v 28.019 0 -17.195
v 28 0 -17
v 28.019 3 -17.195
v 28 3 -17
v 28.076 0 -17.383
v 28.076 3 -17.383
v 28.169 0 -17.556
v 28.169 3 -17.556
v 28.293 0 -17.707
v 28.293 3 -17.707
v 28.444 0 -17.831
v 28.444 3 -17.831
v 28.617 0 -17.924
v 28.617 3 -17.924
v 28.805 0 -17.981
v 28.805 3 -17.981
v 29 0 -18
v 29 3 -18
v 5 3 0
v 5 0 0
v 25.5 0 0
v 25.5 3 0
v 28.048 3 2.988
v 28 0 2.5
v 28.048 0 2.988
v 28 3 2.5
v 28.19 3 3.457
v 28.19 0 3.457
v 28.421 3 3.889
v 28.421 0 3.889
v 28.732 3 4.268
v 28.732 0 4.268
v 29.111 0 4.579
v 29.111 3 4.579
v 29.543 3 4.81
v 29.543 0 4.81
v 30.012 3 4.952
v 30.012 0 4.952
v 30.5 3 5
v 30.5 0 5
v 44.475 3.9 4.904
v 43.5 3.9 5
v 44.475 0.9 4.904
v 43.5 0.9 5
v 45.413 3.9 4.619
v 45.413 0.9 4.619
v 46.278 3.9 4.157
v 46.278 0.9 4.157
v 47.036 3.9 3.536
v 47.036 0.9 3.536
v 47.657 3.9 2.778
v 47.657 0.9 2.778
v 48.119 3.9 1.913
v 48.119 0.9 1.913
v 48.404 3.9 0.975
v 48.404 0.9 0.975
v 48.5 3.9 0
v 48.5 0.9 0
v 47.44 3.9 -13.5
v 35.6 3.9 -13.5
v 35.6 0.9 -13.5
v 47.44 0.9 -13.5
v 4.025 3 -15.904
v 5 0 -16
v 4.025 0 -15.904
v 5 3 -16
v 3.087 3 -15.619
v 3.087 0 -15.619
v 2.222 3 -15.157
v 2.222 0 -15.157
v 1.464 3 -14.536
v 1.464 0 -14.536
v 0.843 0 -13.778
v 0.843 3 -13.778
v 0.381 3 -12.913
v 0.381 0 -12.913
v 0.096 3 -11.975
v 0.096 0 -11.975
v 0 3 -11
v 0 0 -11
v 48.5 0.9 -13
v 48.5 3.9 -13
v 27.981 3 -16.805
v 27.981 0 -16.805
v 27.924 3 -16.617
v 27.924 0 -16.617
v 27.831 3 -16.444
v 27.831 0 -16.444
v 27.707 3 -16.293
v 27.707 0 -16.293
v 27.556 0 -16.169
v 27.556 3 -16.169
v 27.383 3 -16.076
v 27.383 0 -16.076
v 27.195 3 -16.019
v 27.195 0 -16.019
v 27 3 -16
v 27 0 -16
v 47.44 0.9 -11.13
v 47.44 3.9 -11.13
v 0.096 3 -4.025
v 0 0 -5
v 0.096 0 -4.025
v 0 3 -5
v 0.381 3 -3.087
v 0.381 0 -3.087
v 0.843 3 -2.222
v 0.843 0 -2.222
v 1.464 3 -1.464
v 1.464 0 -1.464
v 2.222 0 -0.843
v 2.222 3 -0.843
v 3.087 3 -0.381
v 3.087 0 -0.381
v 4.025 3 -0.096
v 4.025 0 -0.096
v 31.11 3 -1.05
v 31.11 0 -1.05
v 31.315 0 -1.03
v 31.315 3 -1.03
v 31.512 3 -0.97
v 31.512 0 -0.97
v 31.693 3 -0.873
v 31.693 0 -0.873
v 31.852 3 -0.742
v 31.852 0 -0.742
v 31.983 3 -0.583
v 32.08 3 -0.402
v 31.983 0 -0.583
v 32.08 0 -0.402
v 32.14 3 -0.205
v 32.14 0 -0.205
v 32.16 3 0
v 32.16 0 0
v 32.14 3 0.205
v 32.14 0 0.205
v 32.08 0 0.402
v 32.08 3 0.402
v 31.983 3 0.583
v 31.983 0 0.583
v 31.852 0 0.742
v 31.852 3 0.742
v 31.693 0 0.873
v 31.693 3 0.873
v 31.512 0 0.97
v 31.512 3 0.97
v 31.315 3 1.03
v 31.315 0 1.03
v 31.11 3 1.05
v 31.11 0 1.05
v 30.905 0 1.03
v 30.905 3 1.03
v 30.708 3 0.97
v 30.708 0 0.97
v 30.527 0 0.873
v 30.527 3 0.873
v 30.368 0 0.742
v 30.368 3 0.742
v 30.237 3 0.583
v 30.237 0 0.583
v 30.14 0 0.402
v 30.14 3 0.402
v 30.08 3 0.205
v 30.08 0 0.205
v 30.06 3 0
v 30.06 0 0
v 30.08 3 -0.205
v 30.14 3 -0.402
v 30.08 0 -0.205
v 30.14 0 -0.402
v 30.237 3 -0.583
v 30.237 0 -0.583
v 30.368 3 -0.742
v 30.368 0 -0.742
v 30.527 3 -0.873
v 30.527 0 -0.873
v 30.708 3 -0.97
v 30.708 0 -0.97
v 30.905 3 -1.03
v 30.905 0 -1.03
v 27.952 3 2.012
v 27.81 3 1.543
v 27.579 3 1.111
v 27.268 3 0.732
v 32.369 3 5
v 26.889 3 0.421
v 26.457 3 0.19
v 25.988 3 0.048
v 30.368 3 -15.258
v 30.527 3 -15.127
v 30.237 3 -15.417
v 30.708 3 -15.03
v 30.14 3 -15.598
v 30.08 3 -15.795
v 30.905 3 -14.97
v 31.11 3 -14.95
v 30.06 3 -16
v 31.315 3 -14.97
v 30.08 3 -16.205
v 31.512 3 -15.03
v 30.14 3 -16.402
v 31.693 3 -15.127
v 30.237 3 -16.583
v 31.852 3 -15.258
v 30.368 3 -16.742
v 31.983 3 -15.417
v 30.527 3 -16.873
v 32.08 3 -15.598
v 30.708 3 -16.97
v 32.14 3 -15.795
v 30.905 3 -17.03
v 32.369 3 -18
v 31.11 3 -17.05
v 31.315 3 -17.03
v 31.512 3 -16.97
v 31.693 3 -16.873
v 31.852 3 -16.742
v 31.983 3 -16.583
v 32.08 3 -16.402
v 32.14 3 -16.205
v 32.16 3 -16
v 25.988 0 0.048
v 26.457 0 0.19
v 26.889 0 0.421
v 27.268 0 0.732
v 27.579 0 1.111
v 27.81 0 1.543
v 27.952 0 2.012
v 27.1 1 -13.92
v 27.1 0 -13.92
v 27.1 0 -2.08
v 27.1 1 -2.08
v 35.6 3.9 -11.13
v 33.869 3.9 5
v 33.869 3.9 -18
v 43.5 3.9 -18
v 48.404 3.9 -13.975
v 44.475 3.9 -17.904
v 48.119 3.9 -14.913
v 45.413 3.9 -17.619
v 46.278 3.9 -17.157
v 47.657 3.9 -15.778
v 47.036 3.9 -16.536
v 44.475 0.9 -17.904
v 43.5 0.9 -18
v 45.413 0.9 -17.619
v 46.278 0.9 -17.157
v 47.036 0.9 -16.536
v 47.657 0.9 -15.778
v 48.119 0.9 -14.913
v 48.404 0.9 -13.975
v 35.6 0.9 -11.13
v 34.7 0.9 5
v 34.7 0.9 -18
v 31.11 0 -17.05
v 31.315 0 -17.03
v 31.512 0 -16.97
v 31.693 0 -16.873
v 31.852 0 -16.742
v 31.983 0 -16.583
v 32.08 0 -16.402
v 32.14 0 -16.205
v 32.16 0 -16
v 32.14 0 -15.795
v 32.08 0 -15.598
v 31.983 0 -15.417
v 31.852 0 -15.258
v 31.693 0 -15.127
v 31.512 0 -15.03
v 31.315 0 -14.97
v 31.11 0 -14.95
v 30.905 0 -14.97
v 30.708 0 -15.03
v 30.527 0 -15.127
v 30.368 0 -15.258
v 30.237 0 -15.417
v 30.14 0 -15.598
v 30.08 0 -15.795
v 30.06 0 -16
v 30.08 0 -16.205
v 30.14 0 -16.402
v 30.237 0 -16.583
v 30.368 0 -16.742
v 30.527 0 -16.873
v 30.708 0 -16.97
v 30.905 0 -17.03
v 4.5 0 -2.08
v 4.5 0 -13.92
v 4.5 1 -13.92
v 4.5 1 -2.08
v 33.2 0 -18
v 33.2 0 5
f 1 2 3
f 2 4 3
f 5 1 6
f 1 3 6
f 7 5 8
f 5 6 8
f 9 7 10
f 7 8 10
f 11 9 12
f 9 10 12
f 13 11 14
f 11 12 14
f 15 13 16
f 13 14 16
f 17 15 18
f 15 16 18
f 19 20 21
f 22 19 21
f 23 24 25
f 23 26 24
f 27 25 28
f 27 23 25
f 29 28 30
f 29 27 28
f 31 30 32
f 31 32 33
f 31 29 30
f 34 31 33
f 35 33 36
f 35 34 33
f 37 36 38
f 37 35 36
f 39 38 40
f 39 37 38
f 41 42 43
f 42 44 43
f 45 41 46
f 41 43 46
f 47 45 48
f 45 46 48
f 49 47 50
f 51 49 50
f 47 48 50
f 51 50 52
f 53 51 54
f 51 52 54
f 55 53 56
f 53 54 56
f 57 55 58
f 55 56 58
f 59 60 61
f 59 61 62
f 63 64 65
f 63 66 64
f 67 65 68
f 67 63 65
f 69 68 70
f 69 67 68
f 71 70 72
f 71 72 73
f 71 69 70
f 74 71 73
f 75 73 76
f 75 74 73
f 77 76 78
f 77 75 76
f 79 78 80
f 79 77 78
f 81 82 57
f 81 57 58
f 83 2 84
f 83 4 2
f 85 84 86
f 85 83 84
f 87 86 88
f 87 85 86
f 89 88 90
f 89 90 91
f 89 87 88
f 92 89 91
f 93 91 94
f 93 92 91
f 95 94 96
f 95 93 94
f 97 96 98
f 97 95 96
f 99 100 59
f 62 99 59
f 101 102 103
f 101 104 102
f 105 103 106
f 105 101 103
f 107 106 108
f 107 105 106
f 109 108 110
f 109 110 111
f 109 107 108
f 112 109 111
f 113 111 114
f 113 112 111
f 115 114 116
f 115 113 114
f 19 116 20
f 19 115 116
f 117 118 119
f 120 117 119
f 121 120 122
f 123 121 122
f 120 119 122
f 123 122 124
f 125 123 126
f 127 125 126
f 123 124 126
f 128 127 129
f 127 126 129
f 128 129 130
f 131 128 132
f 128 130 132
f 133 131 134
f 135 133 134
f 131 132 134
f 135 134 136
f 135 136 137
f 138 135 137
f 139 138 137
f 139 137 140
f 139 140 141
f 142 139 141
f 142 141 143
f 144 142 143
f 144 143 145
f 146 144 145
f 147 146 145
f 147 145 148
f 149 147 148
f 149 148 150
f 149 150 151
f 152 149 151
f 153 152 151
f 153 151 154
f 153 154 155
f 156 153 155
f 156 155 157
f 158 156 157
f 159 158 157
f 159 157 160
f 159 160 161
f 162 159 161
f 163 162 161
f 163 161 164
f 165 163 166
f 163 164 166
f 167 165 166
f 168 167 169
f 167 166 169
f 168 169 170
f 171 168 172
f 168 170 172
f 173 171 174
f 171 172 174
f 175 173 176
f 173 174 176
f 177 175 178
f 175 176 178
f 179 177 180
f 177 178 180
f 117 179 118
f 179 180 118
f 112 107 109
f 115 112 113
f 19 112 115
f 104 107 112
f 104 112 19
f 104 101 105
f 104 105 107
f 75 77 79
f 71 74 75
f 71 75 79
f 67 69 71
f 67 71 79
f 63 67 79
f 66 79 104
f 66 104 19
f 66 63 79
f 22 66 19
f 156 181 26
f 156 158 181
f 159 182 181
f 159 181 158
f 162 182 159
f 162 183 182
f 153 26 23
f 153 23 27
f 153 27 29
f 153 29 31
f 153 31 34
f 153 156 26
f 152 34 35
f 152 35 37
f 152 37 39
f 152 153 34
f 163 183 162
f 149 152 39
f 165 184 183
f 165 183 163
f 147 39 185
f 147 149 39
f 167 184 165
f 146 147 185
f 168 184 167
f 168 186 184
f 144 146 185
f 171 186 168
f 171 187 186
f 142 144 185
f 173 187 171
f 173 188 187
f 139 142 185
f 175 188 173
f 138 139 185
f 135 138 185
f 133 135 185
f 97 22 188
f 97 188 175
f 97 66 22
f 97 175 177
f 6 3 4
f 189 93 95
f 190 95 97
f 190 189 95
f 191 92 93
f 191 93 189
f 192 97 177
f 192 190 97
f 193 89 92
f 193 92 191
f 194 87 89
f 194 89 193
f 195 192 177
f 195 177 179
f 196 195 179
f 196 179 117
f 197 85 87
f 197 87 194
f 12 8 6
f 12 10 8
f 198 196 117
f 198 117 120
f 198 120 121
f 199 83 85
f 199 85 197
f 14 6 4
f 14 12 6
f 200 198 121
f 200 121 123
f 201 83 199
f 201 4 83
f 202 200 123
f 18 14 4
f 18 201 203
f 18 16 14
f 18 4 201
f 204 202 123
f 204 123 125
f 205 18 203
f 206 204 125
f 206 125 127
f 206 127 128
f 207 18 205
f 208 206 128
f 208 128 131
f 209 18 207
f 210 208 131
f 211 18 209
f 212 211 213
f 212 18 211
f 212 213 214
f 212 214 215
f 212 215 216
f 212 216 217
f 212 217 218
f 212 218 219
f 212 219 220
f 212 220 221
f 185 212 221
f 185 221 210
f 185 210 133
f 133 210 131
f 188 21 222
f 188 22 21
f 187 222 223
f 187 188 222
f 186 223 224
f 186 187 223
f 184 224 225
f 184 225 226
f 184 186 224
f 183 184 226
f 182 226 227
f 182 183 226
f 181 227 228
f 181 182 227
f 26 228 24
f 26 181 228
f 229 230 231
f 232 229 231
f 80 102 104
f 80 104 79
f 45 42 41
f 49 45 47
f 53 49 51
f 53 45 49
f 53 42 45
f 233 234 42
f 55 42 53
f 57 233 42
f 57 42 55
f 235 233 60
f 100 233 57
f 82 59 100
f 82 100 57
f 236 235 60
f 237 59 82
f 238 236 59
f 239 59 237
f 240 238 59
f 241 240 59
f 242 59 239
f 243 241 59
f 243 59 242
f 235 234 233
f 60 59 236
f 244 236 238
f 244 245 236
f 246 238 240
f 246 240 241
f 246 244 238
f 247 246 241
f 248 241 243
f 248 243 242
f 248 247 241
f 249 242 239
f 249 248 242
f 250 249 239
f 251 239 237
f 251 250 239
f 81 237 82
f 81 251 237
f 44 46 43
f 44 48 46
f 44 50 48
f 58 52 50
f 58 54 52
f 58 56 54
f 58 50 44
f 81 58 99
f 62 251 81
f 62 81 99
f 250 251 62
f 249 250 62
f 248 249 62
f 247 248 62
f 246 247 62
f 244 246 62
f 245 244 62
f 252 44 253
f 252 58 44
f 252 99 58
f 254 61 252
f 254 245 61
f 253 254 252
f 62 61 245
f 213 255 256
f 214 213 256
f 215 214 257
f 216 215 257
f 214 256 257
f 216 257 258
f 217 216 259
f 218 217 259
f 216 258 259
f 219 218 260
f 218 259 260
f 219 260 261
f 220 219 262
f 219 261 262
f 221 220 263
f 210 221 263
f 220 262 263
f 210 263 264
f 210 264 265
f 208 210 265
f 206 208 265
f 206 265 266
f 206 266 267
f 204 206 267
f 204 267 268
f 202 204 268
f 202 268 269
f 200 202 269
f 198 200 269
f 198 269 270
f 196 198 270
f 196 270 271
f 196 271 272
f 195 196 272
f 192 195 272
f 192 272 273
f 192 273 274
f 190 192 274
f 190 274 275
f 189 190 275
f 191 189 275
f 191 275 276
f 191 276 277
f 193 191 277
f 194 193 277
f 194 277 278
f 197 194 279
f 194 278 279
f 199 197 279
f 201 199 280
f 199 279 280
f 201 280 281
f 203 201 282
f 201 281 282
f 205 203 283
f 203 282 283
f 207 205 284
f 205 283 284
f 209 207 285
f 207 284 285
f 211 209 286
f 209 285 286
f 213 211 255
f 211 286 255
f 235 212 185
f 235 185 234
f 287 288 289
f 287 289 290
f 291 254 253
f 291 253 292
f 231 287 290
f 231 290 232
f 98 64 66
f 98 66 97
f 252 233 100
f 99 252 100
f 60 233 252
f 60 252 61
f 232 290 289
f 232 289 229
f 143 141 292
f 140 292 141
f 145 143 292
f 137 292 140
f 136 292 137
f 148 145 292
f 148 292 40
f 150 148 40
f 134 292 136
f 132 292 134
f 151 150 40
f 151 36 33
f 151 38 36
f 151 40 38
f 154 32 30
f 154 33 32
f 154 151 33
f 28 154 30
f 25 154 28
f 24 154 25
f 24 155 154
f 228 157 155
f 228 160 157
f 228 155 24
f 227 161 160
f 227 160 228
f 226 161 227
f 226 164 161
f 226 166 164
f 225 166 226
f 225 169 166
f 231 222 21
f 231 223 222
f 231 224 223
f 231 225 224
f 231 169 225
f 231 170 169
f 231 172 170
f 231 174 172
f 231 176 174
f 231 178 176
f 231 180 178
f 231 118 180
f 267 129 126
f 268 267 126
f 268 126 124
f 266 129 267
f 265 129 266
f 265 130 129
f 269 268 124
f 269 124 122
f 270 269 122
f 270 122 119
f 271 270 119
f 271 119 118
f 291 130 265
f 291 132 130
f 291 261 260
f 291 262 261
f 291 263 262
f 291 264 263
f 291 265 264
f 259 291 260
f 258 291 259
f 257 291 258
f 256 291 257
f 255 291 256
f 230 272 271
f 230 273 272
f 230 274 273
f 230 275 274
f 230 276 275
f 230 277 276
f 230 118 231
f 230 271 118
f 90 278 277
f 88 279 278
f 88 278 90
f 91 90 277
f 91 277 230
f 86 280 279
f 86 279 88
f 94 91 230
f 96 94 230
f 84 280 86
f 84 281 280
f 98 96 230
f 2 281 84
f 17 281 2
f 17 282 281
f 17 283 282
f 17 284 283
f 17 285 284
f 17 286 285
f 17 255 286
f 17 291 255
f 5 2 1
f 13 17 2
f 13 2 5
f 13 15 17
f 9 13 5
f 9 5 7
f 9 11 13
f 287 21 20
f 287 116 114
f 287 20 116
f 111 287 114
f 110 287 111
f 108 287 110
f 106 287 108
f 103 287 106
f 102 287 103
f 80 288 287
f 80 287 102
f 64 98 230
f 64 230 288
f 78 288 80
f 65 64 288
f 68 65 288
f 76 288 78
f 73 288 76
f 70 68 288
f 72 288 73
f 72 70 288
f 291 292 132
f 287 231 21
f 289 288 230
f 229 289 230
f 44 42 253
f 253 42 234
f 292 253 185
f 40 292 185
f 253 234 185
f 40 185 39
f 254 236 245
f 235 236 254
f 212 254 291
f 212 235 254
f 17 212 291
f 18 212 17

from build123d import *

# Parameters (mm, degrees)
SKETCH1_W               = 28
SKETCH1_H               = 16
BOSS_EXTRUDE1_DEPTH     = 3
BOSS_EXTRU_1_DEPTH      = 5
BOSS_EXTRU_1_DEPTH_BACK = 18
ESQUISSE8_W             = 11.84
ESQUISSE8_H             = 2.37
ENL_V_MAT_EXTRU_4_DEPTH = 10
ESQUISSE9_W             = 22.6
ESQUISSE9_H             = 11.84
ENL_V_MAT_EXTRU_5_DEPTH = 1
ESQUISSE10_R            = 1.05
ENL_V_MAT_EXTRU_6_DEPTH = 52.879282956
CONG_3_R                = 1
CONG_4_R                = 5
CONG_5_R                = 2.5


with BuildPart() as part:
    # Sketch1 → Boss-Extrude1 (new body)
    with BuildSketch(Plane(origin=(0, 0, 0), x_dir=(1, 0, 0), z_dir=(0, 1, 0))):
        with Locations((14, 8)):
            Rectangle(SKETCH1_W, SKETCH1_H)
    extrude(amount=BOSS_EXTRUDE1_DEPTH)

    # Esquisse1 → Boss.-Extru.1 (add, two sides: drawn at the far end of the back side and taken through both)
    with BuildSketch(Plane.XY.offset(-BOSS_EXTRU_1_DEPTH_BACK)):
        Polygon((32.369048105, 3), (33.869048105, 3.9), (48.5, 3.9), (48.5, 0.9), (34.7, 0.9), (33.2, 0), (28, 0), (28, 3), align=None)
    extrude(amount=BOSS_EXTRU_1_DEPTH + BOSS_EXTRU_1_DEPTH_BACK)

    # Esquisse8 → Enlèv. mat.-Extru.4 (cut)
    with BuildSketch(Plane(origin=(0, 3.9, 0), x_dir=(1, 0, 0), z_dir=(0, 1, 0))):
        with Locations((41.52, 12.315)):
            Rectangle(ESQUISSE8_W, ESQUISSE8_H)
    extrude(amount=-ENL_V_MAT_EXTRU_4_DEPTH, mode=Mode.SUBTRACT)

    # Esquisse9 → Enlèv. mat.-Extru.5 (cut)
    with BuildSketch(Plane.XZ):
        with Locations((15.8, -8)):
            Rectangle(ESQUISSE9_W, ESQUISSE9_H)
    extrude(amount=-ENL_V_MAT_EXTRU_5_DEPTH, mode=Mode.SUBTRACT)

    # Esquisse10 → Enlèv. mat.-Extru.6 (cut, through all)
    with BuildSketch(Plane.XZ):
        with Locations(Location((31.11, 0, 0), (0, 0, 270))):
            Circle(ESQUISSE10_R)
        with Locations(Location((31.11, -16, 0), (0, 0, 270))):
            Circle(ESQUISSE10_R)
    extrude(amount=-ENL_V_MAT_EXTRU_6_DEPTH, mode=Mode.SUBTRACT)

    # Congé3
    cong_3_edges = [part.edges().sort_by_distance(p)[0] for p in [
        (28, 1.5, -16),
    ]]
    fillet(cong_3_edges, radius=CONG_3_R)
    cong_3_2_edges = [part.edges().sort_by_distance(p)[0] for p in [
        (28, 1.5, -18),
    ]]
    fillet(cong_3_2_edges, radius=CONG_3_R - 0.0001)  # a hair under: the kernel refuses the full size

    # Congé4
    cong_4_edges = [part.edges().sort_by_distance(p)[0] for p in [
        (48.5, 2.4, -18),
        (48.5, 2.4, 5),
        (0, 1.5, 0),
        (0, 1.5, -16),
    ]]
    fillet(cong_4_edges, radius=CONG_4_R)

    # Congé5
    cong_5_edges = [part.edges().sort_by_distance(p)[0] for p in [
        (28, 1.5, 0),
    ]]
    fillet(cong_5_edges, radius=CONG_5_R)
    cong_5_2_edges = [part.edges().sort_by_distance(p)[0] for p in [
        (28, 1.5, 5),
    ]]
    fillet(cong_5_2_edges, radius=CONG_5_R - 0.0001)  # a hair under: the kernel refuses the full size


solid = part.part
